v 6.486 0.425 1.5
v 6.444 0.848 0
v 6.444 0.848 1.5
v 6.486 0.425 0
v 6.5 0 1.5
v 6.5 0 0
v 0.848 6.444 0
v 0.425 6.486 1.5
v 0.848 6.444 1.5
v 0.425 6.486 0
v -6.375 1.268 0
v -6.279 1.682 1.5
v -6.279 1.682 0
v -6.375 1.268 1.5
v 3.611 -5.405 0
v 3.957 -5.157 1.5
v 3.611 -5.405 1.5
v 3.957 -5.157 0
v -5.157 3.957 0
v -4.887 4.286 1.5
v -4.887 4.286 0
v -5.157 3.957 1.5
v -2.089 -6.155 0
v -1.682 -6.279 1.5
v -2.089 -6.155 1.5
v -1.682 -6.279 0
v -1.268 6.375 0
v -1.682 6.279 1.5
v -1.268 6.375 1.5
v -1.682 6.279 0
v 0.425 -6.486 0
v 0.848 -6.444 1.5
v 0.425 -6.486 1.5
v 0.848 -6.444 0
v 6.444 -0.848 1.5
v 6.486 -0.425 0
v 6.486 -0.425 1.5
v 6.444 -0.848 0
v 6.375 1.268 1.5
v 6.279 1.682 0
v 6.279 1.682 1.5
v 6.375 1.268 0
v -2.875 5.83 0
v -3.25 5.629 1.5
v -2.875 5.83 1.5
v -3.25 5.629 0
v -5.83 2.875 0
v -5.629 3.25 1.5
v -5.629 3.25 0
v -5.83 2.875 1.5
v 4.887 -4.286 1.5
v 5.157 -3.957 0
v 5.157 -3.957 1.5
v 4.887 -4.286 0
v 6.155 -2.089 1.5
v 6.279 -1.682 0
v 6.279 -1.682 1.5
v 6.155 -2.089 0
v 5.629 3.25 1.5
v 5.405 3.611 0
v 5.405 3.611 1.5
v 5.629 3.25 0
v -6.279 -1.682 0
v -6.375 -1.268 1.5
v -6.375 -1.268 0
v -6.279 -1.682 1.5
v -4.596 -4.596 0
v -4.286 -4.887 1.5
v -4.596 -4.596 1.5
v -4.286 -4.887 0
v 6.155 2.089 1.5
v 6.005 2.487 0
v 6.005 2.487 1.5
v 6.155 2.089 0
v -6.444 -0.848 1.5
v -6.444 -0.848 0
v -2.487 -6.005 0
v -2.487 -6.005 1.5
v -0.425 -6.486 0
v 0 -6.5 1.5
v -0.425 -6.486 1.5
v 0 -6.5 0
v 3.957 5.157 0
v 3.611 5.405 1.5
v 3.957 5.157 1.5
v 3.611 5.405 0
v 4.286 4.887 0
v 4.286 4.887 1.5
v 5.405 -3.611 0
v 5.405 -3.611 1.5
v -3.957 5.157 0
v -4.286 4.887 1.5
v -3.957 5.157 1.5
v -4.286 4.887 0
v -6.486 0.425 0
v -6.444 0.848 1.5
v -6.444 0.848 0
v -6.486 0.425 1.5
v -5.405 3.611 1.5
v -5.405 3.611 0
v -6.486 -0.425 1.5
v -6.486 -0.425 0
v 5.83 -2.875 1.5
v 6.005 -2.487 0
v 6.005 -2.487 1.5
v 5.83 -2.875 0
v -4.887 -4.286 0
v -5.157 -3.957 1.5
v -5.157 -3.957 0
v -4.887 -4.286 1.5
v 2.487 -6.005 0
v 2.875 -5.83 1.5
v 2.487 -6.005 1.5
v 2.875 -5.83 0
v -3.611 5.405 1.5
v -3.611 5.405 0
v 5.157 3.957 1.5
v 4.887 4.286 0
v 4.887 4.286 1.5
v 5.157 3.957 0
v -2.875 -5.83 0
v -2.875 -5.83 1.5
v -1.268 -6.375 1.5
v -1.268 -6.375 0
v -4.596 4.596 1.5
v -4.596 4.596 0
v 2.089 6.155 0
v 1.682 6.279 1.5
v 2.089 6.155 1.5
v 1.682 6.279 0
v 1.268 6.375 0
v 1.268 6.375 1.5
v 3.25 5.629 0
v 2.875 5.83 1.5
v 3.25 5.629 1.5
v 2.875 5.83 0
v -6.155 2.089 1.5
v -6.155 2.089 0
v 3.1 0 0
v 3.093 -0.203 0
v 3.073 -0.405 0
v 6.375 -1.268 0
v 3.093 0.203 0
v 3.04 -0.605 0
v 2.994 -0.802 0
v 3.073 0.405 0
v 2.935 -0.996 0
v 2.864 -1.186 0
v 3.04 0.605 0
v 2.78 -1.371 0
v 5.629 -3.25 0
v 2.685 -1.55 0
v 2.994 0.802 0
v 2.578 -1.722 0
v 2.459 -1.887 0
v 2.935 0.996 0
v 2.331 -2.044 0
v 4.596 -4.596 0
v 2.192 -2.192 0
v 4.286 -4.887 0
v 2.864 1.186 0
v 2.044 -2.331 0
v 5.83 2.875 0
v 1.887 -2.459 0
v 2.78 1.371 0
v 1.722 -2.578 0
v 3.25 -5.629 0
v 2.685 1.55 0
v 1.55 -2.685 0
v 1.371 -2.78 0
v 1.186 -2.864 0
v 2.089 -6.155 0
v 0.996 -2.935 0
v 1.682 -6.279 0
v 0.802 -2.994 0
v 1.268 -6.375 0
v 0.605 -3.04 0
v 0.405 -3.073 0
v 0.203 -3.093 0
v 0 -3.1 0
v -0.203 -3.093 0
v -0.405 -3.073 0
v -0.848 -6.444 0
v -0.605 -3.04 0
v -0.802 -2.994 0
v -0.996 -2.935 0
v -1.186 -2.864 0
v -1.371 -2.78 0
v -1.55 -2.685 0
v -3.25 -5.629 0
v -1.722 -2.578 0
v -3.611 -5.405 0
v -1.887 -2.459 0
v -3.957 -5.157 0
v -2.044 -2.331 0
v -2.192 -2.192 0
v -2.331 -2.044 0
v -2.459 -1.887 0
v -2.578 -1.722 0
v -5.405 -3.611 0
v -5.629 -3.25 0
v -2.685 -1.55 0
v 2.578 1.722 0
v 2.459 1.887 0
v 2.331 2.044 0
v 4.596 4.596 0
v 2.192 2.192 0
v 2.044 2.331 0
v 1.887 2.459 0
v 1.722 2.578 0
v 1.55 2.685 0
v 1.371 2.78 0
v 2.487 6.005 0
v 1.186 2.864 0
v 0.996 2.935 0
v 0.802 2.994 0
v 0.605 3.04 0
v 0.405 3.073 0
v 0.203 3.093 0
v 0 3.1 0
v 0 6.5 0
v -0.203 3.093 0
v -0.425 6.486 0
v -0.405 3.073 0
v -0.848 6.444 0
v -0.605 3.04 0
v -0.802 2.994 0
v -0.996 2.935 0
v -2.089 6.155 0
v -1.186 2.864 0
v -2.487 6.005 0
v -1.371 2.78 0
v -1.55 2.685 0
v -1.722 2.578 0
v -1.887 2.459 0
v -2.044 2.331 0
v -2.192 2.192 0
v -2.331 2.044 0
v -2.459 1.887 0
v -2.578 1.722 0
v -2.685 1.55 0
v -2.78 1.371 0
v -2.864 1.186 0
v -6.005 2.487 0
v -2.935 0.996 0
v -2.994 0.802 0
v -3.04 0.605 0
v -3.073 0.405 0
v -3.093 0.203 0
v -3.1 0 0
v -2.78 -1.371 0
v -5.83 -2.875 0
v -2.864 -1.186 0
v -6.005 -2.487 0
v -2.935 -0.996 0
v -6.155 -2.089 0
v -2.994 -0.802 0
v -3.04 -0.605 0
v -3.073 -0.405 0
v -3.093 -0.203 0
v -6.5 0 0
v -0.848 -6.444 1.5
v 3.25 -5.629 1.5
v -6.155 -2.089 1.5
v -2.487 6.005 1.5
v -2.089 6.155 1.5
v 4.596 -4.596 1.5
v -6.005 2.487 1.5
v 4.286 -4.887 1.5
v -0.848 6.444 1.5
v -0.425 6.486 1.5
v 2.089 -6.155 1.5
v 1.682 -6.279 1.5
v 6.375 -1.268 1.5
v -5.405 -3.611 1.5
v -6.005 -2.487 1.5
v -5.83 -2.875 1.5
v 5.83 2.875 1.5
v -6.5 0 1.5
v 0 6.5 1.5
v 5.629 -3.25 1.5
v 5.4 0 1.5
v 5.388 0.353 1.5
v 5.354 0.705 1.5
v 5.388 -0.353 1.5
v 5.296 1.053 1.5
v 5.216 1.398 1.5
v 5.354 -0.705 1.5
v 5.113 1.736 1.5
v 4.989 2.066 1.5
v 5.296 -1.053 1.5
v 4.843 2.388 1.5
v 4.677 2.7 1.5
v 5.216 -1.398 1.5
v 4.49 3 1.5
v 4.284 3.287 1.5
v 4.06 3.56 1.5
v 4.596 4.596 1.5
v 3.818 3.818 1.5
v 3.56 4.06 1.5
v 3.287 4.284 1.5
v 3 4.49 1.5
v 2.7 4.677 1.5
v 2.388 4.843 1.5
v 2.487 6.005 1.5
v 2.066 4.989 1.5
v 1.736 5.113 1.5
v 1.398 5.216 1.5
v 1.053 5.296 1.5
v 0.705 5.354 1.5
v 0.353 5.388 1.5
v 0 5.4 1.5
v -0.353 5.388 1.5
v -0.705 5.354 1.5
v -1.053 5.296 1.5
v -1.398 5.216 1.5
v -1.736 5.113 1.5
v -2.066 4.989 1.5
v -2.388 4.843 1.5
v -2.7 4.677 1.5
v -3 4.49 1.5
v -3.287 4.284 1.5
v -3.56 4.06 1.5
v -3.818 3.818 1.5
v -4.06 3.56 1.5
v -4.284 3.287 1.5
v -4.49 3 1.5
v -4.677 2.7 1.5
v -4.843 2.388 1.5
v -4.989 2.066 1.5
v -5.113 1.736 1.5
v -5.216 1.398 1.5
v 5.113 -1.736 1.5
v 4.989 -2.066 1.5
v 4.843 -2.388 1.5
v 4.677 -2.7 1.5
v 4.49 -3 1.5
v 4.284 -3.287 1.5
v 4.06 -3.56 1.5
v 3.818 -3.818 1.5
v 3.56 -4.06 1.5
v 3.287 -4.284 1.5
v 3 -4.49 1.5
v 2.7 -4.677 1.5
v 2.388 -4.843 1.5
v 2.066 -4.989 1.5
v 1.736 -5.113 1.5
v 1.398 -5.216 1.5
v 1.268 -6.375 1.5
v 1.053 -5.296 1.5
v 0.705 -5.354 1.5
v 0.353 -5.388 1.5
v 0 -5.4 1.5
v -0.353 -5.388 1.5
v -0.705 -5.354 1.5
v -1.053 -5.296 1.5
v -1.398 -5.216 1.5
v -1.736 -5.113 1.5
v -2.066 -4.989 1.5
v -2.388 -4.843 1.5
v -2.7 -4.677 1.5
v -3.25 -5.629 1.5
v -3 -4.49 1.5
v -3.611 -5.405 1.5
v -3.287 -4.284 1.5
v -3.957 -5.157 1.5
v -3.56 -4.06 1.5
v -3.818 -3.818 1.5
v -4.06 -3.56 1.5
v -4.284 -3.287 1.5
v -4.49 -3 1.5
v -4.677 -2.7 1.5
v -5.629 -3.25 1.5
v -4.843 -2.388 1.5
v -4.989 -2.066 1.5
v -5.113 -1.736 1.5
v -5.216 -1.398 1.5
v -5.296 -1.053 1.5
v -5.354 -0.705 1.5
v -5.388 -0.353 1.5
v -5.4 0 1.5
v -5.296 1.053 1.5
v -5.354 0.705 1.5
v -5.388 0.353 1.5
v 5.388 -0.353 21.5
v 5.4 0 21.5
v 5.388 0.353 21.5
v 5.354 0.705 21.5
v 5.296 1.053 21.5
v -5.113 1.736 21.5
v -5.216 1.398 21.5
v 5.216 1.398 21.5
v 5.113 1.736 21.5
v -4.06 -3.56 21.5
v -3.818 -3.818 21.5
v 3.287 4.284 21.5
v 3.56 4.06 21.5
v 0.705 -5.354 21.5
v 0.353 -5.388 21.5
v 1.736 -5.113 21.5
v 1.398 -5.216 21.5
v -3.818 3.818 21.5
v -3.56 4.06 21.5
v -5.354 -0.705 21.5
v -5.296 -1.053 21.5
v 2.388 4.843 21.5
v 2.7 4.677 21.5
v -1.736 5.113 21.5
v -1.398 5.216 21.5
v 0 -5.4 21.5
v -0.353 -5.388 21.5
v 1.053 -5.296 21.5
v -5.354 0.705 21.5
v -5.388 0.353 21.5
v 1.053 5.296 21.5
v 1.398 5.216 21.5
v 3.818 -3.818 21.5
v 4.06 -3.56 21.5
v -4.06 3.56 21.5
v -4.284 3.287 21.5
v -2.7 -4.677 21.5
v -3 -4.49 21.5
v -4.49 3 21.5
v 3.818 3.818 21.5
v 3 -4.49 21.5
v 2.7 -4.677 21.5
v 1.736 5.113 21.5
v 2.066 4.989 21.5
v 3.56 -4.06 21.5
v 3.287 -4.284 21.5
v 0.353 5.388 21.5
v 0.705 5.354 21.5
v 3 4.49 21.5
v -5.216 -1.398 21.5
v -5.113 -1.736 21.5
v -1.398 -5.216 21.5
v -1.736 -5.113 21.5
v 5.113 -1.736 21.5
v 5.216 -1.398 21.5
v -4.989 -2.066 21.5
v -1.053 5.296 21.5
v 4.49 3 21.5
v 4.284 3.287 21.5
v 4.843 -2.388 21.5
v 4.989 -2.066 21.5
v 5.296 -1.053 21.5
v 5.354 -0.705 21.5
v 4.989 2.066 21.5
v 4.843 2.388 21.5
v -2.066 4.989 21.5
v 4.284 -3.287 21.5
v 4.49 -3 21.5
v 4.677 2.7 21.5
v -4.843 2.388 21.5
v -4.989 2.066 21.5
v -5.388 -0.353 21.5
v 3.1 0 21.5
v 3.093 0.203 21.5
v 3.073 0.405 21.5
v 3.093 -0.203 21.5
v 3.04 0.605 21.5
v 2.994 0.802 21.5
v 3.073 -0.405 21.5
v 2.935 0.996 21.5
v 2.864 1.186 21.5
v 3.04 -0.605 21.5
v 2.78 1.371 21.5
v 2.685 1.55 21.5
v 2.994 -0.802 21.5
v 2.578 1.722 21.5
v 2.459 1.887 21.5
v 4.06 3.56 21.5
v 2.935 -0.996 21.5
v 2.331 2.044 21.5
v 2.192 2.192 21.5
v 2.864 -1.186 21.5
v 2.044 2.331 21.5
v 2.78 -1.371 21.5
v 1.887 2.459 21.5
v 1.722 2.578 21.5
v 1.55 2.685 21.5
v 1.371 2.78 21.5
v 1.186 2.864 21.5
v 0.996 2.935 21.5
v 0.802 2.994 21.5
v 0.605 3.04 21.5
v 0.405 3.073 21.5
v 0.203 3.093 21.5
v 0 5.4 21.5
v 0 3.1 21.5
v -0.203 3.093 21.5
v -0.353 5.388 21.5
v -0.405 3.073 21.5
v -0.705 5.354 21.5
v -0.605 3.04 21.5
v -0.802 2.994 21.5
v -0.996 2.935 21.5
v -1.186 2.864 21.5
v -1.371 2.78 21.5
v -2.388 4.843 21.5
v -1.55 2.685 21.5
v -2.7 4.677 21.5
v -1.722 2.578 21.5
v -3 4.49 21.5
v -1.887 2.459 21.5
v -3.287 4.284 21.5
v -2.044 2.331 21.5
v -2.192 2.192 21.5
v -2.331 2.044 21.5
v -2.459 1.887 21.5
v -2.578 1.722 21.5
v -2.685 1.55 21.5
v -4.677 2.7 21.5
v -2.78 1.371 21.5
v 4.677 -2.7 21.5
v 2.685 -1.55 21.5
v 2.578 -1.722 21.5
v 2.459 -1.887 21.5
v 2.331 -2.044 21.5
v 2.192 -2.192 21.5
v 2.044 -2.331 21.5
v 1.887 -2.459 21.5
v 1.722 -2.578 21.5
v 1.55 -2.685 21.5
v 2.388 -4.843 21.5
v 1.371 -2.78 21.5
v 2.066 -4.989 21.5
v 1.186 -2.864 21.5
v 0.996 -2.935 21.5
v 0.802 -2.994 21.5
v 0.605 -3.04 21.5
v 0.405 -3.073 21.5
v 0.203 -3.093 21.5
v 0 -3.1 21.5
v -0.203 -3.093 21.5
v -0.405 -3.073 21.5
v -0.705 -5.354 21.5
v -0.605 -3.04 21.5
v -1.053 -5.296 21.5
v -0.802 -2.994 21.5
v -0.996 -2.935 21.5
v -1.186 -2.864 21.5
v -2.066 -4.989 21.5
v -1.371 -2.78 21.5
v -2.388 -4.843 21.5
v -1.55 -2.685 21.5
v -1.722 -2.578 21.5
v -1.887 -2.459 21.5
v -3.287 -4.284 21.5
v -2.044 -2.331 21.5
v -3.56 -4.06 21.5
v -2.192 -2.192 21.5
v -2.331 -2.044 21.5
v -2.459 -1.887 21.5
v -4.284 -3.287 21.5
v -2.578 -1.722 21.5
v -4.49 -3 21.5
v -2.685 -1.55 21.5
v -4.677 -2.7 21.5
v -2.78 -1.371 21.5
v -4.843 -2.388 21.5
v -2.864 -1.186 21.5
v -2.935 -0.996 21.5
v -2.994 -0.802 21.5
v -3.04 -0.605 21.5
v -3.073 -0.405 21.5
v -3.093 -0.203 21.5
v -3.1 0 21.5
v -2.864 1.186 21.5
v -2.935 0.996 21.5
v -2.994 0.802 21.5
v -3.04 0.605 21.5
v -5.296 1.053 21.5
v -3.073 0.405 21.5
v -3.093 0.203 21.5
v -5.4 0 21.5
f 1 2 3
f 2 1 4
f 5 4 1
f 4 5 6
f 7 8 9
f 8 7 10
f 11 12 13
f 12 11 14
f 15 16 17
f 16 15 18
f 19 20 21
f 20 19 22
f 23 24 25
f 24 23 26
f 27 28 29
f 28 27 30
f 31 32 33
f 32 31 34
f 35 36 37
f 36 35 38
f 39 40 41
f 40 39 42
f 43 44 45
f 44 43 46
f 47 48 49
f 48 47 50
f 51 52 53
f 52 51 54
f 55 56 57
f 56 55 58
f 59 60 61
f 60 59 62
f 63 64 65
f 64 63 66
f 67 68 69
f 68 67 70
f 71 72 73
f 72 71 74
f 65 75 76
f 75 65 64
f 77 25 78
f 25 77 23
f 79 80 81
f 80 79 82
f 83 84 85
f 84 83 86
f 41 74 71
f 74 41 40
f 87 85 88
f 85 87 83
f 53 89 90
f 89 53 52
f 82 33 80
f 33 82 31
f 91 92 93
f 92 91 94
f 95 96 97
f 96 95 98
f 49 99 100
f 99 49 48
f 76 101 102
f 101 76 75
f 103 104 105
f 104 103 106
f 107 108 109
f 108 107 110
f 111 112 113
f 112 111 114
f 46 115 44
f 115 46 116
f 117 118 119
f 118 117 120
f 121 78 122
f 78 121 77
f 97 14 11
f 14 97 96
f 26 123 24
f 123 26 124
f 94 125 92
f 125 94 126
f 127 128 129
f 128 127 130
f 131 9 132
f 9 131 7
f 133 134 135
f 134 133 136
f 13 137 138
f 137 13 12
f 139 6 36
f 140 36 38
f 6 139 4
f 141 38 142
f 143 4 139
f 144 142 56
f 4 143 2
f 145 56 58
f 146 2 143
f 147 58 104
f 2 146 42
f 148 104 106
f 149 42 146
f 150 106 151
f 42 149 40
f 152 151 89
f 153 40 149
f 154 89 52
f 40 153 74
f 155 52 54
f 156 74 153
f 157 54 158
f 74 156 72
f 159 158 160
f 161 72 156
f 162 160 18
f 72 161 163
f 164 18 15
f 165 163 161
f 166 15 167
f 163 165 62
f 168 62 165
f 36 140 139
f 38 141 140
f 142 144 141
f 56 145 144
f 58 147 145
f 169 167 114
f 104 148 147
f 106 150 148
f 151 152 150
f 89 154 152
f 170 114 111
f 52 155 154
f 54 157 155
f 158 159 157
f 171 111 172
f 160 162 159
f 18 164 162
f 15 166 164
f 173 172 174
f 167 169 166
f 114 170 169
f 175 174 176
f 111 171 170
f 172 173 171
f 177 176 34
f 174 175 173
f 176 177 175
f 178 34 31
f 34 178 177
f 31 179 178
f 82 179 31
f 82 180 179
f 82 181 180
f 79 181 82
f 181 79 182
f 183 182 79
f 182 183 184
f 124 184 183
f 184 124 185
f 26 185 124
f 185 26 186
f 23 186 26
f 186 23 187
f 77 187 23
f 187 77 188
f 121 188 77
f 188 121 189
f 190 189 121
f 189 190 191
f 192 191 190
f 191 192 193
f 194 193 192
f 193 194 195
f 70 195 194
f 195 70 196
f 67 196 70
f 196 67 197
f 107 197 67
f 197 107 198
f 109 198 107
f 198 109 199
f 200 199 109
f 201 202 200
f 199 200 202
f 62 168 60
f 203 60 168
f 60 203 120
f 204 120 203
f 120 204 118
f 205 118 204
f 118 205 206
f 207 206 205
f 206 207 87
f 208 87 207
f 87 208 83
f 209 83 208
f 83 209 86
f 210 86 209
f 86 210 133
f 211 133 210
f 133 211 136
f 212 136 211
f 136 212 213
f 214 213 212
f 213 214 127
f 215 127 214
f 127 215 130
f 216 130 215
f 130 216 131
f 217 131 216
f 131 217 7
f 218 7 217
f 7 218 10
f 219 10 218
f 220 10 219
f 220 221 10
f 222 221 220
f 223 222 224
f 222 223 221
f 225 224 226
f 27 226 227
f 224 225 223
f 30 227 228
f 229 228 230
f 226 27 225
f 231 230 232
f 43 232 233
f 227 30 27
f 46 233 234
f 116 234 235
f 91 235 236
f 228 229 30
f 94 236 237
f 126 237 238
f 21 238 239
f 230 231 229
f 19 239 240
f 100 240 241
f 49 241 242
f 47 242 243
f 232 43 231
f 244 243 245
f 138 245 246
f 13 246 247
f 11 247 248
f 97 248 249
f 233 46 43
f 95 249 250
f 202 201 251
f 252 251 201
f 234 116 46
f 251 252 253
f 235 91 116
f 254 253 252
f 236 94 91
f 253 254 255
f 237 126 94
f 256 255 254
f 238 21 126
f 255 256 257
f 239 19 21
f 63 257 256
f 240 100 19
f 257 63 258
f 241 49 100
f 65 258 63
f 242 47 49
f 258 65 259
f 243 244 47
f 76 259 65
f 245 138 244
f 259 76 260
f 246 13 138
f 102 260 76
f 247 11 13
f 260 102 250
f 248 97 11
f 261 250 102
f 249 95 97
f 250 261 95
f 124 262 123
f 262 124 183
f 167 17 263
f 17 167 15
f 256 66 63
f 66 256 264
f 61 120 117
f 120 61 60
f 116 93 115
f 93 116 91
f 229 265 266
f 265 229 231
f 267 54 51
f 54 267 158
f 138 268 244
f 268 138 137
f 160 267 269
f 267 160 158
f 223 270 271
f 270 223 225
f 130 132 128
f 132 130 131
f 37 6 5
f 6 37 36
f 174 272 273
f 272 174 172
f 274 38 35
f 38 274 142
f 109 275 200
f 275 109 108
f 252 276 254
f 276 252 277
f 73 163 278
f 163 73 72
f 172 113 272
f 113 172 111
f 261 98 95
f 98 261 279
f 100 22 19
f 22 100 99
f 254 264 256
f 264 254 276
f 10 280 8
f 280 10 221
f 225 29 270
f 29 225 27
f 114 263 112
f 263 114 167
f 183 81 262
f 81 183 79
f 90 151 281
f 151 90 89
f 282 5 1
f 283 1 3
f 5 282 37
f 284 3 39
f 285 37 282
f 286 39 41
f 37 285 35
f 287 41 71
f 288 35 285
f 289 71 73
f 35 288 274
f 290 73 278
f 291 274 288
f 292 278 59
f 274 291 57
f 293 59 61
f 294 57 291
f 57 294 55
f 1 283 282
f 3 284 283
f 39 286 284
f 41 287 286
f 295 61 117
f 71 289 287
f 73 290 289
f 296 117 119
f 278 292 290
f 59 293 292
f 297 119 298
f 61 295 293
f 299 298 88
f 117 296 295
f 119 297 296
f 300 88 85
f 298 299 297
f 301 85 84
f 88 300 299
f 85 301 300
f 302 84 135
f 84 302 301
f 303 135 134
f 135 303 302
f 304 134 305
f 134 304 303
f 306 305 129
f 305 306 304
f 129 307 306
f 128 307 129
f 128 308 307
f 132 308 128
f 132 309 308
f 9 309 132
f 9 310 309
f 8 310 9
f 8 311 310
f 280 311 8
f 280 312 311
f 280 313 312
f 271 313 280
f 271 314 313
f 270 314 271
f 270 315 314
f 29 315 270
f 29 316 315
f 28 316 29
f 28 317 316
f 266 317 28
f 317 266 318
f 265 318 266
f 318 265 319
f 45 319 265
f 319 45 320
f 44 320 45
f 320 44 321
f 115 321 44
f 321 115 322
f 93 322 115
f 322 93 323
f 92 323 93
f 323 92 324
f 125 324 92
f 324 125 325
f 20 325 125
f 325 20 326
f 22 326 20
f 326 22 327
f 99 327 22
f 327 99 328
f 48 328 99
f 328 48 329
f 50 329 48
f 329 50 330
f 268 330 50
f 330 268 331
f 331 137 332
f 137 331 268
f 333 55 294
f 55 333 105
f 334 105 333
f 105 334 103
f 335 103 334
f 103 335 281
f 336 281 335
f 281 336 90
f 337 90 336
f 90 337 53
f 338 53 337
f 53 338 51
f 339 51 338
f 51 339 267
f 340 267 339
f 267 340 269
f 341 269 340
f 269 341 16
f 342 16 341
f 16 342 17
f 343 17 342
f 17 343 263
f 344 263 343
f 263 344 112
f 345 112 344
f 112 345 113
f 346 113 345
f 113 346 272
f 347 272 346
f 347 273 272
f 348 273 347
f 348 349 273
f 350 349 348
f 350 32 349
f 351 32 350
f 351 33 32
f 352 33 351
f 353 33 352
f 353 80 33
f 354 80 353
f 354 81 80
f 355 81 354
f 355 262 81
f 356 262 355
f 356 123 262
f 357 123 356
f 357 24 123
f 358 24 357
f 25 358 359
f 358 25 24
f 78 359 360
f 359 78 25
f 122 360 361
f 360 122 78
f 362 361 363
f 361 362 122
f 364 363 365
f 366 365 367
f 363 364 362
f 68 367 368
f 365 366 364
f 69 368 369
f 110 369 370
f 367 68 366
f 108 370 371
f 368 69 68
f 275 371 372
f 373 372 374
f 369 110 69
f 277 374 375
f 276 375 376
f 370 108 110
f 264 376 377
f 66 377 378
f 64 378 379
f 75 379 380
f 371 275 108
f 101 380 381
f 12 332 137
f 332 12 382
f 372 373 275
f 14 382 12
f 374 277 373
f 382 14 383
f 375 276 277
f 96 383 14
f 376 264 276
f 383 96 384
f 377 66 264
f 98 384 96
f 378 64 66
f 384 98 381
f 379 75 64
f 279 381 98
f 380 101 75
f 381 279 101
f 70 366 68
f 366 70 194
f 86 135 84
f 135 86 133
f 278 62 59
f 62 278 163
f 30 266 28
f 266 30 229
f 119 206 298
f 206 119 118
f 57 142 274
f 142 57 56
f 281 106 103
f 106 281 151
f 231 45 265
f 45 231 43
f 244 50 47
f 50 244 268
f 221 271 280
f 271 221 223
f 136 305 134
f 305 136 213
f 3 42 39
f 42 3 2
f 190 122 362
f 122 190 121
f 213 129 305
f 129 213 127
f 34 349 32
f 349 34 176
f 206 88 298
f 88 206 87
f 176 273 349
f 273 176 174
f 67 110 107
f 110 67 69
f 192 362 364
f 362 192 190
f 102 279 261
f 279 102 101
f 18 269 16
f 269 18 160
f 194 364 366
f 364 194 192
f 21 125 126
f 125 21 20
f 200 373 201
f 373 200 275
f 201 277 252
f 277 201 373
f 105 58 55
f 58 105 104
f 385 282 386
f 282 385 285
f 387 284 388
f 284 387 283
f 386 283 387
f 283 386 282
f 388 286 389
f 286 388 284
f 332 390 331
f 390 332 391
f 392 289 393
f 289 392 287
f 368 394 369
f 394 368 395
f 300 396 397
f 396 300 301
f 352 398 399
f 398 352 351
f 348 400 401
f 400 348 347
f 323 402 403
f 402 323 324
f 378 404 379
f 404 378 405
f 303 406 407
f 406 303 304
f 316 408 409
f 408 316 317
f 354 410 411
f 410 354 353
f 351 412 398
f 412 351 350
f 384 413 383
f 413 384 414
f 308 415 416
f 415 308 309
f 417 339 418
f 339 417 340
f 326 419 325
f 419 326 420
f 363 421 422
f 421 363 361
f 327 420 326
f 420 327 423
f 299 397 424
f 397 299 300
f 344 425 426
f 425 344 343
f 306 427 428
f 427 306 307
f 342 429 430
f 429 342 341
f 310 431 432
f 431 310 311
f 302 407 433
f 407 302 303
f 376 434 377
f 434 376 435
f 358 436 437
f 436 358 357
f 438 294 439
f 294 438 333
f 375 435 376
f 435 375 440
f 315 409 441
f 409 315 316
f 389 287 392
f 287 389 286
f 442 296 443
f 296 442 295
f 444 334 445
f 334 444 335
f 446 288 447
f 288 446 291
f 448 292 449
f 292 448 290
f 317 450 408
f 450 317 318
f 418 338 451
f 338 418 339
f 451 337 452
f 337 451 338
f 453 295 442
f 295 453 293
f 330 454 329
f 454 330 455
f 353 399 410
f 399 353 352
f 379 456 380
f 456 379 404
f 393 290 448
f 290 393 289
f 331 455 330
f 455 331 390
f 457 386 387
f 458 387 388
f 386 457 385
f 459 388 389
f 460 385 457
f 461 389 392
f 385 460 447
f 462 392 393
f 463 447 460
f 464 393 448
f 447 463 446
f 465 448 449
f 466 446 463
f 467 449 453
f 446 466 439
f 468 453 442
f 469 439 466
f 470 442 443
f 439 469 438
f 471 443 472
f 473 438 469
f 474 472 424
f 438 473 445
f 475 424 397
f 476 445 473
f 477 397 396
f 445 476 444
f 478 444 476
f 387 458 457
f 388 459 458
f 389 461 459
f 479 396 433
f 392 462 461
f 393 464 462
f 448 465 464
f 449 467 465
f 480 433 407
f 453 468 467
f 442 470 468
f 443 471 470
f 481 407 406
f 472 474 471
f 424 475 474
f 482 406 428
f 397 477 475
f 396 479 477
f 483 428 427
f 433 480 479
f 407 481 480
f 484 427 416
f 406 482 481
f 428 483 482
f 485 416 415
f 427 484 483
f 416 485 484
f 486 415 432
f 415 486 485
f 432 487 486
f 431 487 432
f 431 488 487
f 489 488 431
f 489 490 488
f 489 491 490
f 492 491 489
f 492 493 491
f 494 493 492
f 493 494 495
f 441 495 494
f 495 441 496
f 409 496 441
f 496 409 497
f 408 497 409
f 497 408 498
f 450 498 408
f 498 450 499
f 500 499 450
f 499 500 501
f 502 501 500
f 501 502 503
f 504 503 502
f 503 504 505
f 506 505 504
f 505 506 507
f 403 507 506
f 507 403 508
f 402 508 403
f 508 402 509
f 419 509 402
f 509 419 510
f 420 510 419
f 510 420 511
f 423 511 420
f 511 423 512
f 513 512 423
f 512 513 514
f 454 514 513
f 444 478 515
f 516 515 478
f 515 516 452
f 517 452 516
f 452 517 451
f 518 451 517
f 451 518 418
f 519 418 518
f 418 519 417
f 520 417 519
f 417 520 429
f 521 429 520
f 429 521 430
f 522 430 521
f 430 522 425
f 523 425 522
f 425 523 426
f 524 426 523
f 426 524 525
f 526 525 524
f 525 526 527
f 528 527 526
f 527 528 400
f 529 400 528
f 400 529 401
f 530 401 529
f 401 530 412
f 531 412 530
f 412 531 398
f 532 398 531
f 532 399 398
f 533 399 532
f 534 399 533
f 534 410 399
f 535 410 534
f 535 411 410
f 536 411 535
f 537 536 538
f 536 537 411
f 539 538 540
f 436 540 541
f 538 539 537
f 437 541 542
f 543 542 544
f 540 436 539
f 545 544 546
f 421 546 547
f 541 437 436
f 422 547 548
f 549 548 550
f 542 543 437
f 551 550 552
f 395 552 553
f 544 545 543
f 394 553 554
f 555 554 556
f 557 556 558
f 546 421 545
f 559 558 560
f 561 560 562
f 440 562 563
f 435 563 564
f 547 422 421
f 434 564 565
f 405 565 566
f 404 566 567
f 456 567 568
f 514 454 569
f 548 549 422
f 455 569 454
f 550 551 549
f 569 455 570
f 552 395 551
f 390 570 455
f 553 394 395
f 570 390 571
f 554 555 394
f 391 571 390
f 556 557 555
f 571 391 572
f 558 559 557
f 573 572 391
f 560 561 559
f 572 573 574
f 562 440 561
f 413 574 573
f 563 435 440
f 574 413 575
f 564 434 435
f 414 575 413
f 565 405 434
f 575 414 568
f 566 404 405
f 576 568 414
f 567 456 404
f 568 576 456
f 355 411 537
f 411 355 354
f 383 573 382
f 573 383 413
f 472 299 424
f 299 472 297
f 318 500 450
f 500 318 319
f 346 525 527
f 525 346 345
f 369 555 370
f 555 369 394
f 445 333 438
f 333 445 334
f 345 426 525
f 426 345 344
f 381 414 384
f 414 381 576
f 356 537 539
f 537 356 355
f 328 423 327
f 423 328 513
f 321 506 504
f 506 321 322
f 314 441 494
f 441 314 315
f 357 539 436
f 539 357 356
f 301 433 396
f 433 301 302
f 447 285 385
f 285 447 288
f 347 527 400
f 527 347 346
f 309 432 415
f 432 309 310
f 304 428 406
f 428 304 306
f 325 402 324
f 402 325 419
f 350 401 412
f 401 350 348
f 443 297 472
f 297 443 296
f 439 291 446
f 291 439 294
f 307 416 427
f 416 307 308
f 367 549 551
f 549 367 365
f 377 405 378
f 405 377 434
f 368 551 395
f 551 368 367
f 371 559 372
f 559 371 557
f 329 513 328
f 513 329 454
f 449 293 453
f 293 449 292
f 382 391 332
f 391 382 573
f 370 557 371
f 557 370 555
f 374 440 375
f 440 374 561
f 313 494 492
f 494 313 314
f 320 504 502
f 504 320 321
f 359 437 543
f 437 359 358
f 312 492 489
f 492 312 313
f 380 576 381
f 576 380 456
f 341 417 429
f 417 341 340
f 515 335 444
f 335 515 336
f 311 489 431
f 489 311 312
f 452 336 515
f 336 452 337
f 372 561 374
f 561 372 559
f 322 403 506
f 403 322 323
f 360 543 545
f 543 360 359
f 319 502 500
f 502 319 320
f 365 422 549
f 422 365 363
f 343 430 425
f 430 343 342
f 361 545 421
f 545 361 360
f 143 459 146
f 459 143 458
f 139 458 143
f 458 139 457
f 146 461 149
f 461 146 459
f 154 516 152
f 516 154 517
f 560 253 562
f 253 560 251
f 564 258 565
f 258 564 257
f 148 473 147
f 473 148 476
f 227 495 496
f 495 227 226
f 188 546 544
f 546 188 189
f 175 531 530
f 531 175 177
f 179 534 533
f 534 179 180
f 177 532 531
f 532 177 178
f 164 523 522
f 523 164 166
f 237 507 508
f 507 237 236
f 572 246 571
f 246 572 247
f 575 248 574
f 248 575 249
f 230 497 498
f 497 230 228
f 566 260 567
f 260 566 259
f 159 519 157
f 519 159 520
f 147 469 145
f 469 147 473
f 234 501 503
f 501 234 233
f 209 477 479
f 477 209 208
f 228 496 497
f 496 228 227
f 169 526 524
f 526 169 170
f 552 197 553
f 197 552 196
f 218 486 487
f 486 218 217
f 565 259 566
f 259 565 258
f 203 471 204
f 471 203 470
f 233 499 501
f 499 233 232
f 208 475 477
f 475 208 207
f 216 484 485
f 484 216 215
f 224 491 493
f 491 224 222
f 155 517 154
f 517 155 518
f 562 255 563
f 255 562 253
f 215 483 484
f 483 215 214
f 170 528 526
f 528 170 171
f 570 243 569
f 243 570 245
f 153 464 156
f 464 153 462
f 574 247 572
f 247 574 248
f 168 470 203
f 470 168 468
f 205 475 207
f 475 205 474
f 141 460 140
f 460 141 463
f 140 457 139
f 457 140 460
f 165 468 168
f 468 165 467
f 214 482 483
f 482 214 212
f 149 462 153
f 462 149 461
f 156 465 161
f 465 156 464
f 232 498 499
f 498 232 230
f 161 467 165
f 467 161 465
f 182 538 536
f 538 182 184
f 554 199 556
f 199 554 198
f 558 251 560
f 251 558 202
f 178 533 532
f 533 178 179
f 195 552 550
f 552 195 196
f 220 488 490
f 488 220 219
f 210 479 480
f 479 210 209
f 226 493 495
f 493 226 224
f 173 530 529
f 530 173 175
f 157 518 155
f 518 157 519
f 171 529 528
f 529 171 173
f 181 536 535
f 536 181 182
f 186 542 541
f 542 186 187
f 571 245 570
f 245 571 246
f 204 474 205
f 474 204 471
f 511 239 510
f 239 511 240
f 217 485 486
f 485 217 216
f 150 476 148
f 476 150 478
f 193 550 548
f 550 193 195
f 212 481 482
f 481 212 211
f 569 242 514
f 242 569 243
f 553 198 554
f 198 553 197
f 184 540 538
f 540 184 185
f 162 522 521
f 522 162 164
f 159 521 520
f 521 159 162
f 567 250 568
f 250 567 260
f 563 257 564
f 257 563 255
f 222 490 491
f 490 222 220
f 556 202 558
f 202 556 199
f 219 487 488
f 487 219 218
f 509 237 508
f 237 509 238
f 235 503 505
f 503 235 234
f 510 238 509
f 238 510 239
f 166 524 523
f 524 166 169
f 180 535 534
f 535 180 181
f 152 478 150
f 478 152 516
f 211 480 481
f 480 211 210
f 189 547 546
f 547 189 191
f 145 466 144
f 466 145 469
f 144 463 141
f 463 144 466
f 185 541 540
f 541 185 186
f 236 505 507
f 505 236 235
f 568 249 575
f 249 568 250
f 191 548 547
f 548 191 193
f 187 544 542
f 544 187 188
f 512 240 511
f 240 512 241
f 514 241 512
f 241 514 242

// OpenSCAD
// Adapter sleeve: lets a 0.2 mL PCR tube sit in a 1.5 mL tube rack hole
// Print orientation: collar on bed (z = 0), sleeve body rises to z = 21.5

// ---------------- Parameters ----------------
collar_d    = 13;     // collar outer diameter
collar_h    = 1.5;    // collar thickness (z = 0 to 1.5)
sleeve_od   = 10.8;   // sleeve body outer diameter
sleeve_top  = 21.5;   // top of sleeve body (z)
bore_d      = 6.2;    // through-bore diameter (0.2 mL tube outer diameter)
eps         = 0.5;    // cutter overshoot past faces

$fn = 96;

// ---------------- Model ----------------
difference() {
    union() {
        // Collar
        cylinder(d = collar_d, h = collar_h);

        // Sleeve body (overlaps the collar slightly for a clean union)
        translate([0, 0, collar_h - 0.01])
            cylinder(d = sleeve_od, h = sleeve_top - collar_h + 0.01);
    }

    // Full-length bore, open at both ends
    translate([0, 0, -eps])
        cylinder(d = bore_d, h = sleeve_top + 2 * eps);
}
